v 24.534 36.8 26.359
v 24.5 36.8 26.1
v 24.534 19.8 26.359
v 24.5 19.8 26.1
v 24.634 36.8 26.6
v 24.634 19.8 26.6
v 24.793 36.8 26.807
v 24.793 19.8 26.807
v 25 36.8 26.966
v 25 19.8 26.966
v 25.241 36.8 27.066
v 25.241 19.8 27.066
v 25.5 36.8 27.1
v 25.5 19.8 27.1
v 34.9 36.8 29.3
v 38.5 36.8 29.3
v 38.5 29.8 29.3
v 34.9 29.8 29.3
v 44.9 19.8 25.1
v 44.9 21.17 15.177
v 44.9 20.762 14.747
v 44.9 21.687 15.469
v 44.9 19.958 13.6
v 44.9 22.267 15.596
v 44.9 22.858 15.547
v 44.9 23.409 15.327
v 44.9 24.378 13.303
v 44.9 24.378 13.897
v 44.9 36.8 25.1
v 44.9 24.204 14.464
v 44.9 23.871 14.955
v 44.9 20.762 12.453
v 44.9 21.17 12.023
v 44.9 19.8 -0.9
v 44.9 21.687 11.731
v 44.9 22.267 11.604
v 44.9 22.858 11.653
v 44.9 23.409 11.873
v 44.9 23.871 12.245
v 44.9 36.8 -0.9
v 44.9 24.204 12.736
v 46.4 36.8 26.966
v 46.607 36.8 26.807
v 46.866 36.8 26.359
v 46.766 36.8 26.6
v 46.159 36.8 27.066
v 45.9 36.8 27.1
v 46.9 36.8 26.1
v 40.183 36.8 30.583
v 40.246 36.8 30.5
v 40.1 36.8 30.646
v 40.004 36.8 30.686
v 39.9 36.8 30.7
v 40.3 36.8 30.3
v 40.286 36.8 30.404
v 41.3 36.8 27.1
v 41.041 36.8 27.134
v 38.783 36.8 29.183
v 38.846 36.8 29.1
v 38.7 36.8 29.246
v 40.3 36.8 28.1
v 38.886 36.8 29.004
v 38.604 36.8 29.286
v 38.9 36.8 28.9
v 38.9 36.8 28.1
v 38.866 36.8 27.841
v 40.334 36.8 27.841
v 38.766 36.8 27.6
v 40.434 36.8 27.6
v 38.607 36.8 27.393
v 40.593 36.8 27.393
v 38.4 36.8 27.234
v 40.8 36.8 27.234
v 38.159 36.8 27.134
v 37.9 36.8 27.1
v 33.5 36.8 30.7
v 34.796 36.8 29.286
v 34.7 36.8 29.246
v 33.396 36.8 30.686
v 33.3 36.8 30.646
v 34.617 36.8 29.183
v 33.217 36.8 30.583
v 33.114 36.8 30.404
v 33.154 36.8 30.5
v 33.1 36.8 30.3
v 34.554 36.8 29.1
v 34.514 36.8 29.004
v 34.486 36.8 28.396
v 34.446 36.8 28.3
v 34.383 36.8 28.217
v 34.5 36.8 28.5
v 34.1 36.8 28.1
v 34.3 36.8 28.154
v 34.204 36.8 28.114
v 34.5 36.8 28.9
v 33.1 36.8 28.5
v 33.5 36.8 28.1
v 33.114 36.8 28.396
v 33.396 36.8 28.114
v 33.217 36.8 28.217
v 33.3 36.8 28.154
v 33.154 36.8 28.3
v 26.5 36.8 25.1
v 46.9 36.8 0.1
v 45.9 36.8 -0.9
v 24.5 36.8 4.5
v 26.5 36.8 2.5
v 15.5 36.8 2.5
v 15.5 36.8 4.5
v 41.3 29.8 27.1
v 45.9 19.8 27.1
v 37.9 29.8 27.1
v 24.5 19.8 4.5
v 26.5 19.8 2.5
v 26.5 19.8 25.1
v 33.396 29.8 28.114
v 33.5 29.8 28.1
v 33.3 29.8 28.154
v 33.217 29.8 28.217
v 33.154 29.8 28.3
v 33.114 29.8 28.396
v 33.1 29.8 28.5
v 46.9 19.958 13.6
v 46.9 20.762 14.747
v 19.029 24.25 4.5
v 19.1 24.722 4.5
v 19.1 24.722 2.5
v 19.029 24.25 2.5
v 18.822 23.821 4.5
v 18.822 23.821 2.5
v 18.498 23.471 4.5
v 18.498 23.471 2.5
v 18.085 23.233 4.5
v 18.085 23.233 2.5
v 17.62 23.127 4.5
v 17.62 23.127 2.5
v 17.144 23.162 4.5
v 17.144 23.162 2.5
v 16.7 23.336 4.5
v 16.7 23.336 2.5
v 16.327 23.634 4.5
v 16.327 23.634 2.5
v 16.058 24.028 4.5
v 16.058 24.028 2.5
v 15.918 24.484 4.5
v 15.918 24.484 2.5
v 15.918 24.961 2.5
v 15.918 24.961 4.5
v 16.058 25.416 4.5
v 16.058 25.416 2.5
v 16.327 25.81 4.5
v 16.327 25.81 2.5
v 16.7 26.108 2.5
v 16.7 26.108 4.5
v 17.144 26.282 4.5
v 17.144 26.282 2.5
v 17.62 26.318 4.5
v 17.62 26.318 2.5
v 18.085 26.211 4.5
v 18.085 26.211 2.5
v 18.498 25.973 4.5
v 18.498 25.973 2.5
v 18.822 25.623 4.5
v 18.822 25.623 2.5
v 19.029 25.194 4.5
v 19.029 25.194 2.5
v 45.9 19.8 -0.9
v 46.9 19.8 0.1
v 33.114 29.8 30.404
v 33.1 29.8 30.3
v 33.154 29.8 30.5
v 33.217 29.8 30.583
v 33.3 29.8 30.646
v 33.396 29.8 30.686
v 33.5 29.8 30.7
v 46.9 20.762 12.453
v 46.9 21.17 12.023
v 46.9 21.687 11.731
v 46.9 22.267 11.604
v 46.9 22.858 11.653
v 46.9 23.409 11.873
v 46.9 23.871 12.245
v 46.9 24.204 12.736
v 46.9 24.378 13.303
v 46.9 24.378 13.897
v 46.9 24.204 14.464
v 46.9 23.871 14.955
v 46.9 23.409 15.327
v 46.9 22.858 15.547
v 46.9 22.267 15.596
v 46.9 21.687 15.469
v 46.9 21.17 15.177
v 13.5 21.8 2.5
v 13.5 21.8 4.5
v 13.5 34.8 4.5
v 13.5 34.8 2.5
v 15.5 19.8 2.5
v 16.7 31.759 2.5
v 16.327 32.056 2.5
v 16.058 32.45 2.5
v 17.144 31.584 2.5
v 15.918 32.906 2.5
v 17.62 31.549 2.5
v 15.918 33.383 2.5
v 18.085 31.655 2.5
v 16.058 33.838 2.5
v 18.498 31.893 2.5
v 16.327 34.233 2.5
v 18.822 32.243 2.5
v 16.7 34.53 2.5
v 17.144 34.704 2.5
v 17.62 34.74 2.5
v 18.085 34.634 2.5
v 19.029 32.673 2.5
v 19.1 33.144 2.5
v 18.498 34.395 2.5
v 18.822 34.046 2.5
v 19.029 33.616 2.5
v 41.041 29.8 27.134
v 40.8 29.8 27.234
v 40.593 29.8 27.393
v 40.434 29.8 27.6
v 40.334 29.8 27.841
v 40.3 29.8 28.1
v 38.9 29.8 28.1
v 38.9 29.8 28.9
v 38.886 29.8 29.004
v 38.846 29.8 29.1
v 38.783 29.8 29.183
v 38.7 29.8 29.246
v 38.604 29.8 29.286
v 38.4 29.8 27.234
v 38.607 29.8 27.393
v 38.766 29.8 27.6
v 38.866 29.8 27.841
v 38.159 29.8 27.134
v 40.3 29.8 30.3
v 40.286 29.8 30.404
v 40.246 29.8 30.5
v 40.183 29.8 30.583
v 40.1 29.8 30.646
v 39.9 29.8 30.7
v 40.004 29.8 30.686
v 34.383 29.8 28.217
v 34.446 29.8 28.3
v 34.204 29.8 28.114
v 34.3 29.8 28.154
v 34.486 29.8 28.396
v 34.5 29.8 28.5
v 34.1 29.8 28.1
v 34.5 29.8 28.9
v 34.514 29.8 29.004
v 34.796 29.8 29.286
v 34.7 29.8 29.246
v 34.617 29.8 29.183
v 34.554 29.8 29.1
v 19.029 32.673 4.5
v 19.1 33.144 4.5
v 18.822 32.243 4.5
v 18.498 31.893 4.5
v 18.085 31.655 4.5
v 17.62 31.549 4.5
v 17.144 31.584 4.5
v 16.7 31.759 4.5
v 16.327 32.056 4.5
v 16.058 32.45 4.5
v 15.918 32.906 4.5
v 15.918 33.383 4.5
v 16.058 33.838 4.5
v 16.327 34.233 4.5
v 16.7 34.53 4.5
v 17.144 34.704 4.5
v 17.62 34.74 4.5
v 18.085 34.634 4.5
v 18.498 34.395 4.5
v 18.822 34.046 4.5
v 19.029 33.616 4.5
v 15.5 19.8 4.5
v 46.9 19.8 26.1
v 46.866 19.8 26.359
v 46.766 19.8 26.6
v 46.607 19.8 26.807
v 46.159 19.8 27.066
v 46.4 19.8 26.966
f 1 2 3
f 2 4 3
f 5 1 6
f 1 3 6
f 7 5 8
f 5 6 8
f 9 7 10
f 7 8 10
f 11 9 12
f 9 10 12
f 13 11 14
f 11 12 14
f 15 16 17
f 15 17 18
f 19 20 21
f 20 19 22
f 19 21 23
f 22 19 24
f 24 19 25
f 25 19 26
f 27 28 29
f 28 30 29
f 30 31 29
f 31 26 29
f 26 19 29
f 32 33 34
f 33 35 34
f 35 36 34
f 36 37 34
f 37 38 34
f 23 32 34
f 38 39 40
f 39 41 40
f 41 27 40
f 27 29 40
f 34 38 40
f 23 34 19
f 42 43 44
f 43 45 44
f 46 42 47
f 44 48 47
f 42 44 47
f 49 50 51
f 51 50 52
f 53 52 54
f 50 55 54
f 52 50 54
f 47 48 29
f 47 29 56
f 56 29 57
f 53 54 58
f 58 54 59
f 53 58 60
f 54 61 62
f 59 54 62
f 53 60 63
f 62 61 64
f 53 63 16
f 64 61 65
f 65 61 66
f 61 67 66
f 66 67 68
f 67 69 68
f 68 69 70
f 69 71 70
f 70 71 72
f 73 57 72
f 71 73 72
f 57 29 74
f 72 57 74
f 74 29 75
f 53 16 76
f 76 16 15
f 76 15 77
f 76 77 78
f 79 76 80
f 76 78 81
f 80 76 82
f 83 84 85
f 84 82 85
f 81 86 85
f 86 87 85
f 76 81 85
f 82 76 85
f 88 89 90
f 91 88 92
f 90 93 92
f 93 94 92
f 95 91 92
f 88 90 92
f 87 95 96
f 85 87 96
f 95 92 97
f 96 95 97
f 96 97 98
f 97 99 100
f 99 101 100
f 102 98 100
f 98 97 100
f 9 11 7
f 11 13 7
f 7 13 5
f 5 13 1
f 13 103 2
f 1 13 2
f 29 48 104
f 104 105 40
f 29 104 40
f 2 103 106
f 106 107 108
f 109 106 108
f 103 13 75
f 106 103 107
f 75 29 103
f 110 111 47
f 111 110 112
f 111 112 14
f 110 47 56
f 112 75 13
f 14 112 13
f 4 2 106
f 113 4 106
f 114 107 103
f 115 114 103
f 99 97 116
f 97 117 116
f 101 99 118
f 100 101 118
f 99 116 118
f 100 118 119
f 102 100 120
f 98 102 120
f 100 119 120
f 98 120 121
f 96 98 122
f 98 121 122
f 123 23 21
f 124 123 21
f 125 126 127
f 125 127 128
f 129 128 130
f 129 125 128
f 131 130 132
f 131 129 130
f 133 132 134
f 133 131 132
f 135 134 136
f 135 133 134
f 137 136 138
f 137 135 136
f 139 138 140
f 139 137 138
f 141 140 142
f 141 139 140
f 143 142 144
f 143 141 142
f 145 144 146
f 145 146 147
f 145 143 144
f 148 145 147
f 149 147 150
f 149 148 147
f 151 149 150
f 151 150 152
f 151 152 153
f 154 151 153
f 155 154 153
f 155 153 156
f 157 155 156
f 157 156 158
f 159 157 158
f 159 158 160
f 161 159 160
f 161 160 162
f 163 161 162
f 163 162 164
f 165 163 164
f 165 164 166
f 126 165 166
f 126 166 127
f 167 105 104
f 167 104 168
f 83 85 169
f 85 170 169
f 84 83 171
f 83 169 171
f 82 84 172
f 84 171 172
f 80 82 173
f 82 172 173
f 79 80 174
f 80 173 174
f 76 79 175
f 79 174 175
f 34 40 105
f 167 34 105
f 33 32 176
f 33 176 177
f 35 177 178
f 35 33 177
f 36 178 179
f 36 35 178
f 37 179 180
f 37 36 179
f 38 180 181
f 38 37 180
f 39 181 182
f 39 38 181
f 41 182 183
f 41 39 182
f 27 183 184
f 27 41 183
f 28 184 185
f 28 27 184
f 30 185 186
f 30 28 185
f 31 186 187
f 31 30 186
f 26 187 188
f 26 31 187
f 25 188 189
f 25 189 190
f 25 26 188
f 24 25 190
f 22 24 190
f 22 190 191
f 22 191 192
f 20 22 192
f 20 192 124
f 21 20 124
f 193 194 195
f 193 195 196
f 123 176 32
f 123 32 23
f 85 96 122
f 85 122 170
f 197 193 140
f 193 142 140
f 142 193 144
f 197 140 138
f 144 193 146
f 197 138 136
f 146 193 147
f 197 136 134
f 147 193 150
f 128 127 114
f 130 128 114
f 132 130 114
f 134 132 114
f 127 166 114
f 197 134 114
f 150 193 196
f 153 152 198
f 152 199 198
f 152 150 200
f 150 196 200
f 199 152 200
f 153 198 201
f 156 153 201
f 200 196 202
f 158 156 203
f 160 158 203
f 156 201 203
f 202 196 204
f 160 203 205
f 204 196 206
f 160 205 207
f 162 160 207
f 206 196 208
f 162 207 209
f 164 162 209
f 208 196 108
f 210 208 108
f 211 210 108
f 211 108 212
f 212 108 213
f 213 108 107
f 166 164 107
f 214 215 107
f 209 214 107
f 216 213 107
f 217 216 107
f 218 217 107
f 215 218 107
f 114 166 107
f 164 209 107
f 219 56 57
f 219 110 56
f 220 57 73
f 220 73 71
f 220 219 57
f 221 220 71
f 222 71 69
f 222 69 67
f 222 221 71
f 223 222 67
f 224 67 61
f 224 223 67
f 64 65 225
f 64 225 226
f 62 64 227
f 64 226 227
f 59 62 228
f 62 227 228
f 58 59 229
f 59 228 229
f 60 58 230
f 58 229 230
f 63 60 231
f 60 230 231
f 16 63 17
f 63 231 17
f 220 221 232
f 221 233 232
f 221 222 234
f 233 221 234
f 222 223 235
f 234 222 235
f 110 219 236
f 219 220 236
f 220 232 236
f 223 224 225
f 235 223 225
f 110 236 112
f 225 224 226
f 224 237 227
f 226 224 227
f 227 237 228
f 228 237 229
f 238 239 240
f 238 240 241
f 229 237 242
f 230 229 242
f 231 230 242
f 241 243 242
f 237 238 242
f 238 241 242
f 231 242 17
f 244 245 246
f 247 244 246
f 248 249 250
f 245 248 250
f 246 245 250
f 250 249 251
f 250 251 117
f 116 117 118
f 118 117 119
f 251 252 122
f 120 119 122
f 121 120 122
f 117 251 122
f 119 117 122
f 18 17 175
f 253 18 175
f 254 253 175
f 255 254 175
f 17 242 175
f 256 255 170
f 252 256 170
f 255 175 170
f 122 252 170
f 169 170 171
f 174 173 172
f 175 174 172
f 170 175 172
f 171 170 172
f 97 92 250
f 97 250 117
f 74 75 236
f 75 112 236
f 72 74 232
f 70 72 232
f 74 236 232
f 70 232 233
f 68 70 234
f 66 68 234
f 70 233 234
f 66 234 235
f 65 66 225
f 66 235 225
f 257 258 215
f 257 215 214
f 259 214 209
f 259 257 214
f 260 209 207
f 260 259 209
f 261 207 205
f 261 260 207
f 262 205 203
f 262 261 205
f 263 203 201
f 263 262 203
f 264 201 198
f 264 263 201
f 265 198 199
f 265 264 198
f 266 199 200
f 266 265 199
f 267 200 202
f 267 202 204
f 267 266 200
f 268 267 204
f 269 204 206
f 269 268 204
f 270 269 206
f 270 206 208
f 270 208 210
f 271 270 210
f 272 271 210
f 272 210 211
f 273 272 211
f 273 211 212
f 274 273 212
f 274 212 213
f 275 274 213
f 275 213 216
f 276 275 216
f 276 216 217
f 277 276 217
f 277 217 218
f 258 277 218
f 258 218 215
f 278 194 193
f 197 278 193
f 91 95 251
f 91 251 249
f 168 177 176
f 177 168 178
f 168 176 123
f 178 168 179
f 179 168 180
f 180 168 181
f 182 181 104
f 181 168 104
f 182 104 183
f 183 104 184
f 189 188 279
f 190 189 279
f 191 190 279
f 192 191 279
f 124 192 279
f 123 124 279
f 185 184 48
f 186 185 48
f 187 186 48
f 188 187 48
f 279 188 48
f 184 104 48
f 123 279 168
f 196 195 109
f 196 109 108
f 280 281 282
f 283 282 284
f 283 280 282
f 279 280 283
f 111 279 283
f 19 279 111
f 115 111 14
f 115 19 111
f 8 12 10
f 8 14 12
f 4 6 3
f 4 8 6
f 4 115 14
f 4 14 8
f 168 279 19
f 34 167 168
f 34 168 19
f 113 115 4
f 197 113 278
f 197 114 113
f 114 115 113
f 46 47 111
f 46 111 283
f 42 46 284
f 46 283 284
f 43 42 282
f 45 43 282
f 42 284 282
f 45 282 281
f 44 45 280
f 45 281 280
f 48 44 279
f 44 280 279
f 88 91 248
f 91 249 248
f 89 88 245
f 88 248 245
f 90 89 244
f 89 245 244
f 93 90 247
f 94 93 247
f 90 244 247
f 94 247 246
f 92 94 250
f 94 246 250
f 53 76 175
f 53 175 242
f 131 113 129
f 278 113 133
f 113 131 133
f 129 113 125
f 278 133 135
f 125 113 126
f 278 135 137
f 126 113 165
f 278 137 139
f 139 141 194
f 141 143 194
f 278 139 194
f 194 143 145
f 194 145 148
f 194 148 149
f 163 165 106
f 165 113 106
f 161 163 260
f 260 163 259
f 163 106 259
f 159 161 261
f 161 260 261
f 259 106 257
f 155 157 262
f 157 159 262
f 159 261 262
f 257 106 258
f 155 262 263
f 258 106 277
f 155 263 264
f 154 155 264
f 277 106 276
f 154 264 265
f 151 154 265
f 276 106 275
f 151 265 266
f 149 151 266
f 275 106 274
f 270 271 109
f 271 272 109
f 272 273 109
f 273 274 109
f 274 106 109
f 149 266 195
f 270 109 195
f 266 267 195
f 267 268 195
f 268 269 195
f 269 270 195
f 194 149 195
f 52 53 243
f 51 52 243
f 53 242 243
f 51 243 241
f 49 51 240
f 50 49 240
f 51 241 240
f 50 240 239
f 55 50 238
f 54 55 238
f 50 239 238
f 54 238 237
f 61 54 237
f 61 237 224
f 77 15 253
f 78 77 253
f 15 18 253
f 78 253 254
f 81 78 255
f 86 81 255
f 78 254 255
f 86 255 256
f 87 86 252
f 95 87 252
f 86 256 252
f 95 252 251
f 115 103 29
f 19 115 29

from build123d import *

# Parameters (mm, degrees)
PAD015_DEPTH            = 17
SKETCH026_R             = 1.6
POCKET011_DEPTH         = 5
POCKET012_DEPTH         = 5
FILLET004_R             = 1
CHAMFER002_SIZE         = 2
CHAMFER003_SIZE         = 1
PAD014_DEPTH            = 7
FILLET003_R             = 1
FILLET002_R             = 0.4
BODY006_ROLL_ANGLE      = -90
BODY006_PLACEMENT_ANGLE = 180


with BuildPart() as soporte_tt:
    # Sketch027 → Pad015 (new body)
    with BuildSketch(Plane.XY):
        Polygon((-2, -24.6), (-2, -2), (-13, -2), (-13, 0), (0, 0), (0, -22.6), (18.4, -22.6), (18.4, 3.4), (20.4, 3.4), (20.4, -24.6), align=None)
    extrude(amount=PAD015_DEPTH)

    # Sketch026 (on Face2 of Pad015) → Pocket011 (cut)
    with BuildSketch(Plane.XZ.offset(2)):
        with Locations((-9, 3.655766)):
            Circle(SKETCH026_R)
        with Locations((-9, 12.077909)):
            Circle(SKETCH026_R)
    extrude(amount=-POCKET011_DEPTH, mode=Mode.SUBTRACT)

    # Sketch025 → Pocket012 (cut)
    with BuildSketch(Plane(origin=(18.4, 0, 0), x_dir=(0, -1, 0), z_dir=(-1, 0, 0))):
        with BuildLine():
            ThreePointArc((9.9528471273, 16.0383040886), (11.1, 12.4), (12.2471528727, 16.0383040886))
            Line((11.1, 16.8415491775), (12.2471528727, 16.0383040886))
            Line((9.9528471273, 16.0383040886), (11.1, 16.8415491775))
        make_face()
    extrude(amount=-POCKET012_DEPTH, mode=Mode.SUBTRACT)

    # Fillet004
    fillet004_edges = [soporte_tt.edges().sort_by_distance(p)[0] for p in [
        (-2, -24.6, 8.5),
        (20.4, -24.6, 8.5),
    ]]
    fillet(fillet004_edges, radius=FILLET004_R)

    # Chamfer002
    chamfer002_edges = [soporte_tt.edges().sort_by_distance(p)[0] for p in [
        (-13, -1, 17),
        (-13, -1, 0),
    ]]
    chamfer(chamfer002_edges, length=CHAMFER002_SIZE)

    # Chamfer003
    chamfer003_edges = [soporte_tt.edges().sort_by_distance(p)[0] for p in [
        (20.4, 3.4, 8.5),
    ]]
    chamfer(chamfer003_edges, length=CHAMFER003_SIZE)

    # Sketch028 (on Face1 of Chamfer003) → Pad014 (join)
    with BuildSketch(Plane(origin=(0, 0, 0), x_dir=(1, 0, 0), z_dir=(0, 0, -1))):
        Polygon((13.8, 24.6), (12.4, 24.6), (12.4, 26.8), (8, 26.8), (8, 25.6), (6.6, 25.6), (6.6, 28.2), (13.8, 28.2), align=None)
    extrude(amount=-PAD014_DEPTH)

    # Fillet003
    fillet003_edges = [soporte_tt.edges().sort_by_distance(p)[0] for p in [
        (12.4, -24.6, 3.5),
        (13.8, -24.6, 3.5),
    ]]
    fillet(fillet003_edges, radius=FILLET003_R)

    # Fillet002
    fillet002_edges = [soporte_tt.edges().sort_by_distance(p)[0] for p in [
        (13.8, -28.2, 3.5),
        (6.6, -28.2, 3.5),
        (6.6, -25.6, 3.5),
        (12.4, -26.8, 3.5),
        (8, -26.8, 3.5),
        (8, -25.6, 3.5),
    ]]
    fillet(fillet002_edges, radius=FILLET002_R)


with BuildPart() as soporte_tt_1:
    # Body006 roll: moved
    add(soporte_tt.part.rotate(Axis((0, 0, 0), (1, 0, 0)), BODY006_ROLL_ANGLE))


with BuildPart() as soporte_tt_2:
    # Body006 placement: moved
    add(soporte_tt_1.part.moved(Location((-26.5, 36.8, 2.5))).rotate(Axis((-26.5, 36.8, 2.5), (0, 0, 1)), BODY006_PLACEMENT_ANGLE))


with BuildPart() as part_mirroring001:
    # Part__Mirroring001: instance of soporte_TT
    add(soporte_tt_2.part.mirror(Plane(origin=(0, 0, 0), x_dir=(0, -1, 0), z_dir=(1, 0, 0))))


solid = part_mirroring001.part
